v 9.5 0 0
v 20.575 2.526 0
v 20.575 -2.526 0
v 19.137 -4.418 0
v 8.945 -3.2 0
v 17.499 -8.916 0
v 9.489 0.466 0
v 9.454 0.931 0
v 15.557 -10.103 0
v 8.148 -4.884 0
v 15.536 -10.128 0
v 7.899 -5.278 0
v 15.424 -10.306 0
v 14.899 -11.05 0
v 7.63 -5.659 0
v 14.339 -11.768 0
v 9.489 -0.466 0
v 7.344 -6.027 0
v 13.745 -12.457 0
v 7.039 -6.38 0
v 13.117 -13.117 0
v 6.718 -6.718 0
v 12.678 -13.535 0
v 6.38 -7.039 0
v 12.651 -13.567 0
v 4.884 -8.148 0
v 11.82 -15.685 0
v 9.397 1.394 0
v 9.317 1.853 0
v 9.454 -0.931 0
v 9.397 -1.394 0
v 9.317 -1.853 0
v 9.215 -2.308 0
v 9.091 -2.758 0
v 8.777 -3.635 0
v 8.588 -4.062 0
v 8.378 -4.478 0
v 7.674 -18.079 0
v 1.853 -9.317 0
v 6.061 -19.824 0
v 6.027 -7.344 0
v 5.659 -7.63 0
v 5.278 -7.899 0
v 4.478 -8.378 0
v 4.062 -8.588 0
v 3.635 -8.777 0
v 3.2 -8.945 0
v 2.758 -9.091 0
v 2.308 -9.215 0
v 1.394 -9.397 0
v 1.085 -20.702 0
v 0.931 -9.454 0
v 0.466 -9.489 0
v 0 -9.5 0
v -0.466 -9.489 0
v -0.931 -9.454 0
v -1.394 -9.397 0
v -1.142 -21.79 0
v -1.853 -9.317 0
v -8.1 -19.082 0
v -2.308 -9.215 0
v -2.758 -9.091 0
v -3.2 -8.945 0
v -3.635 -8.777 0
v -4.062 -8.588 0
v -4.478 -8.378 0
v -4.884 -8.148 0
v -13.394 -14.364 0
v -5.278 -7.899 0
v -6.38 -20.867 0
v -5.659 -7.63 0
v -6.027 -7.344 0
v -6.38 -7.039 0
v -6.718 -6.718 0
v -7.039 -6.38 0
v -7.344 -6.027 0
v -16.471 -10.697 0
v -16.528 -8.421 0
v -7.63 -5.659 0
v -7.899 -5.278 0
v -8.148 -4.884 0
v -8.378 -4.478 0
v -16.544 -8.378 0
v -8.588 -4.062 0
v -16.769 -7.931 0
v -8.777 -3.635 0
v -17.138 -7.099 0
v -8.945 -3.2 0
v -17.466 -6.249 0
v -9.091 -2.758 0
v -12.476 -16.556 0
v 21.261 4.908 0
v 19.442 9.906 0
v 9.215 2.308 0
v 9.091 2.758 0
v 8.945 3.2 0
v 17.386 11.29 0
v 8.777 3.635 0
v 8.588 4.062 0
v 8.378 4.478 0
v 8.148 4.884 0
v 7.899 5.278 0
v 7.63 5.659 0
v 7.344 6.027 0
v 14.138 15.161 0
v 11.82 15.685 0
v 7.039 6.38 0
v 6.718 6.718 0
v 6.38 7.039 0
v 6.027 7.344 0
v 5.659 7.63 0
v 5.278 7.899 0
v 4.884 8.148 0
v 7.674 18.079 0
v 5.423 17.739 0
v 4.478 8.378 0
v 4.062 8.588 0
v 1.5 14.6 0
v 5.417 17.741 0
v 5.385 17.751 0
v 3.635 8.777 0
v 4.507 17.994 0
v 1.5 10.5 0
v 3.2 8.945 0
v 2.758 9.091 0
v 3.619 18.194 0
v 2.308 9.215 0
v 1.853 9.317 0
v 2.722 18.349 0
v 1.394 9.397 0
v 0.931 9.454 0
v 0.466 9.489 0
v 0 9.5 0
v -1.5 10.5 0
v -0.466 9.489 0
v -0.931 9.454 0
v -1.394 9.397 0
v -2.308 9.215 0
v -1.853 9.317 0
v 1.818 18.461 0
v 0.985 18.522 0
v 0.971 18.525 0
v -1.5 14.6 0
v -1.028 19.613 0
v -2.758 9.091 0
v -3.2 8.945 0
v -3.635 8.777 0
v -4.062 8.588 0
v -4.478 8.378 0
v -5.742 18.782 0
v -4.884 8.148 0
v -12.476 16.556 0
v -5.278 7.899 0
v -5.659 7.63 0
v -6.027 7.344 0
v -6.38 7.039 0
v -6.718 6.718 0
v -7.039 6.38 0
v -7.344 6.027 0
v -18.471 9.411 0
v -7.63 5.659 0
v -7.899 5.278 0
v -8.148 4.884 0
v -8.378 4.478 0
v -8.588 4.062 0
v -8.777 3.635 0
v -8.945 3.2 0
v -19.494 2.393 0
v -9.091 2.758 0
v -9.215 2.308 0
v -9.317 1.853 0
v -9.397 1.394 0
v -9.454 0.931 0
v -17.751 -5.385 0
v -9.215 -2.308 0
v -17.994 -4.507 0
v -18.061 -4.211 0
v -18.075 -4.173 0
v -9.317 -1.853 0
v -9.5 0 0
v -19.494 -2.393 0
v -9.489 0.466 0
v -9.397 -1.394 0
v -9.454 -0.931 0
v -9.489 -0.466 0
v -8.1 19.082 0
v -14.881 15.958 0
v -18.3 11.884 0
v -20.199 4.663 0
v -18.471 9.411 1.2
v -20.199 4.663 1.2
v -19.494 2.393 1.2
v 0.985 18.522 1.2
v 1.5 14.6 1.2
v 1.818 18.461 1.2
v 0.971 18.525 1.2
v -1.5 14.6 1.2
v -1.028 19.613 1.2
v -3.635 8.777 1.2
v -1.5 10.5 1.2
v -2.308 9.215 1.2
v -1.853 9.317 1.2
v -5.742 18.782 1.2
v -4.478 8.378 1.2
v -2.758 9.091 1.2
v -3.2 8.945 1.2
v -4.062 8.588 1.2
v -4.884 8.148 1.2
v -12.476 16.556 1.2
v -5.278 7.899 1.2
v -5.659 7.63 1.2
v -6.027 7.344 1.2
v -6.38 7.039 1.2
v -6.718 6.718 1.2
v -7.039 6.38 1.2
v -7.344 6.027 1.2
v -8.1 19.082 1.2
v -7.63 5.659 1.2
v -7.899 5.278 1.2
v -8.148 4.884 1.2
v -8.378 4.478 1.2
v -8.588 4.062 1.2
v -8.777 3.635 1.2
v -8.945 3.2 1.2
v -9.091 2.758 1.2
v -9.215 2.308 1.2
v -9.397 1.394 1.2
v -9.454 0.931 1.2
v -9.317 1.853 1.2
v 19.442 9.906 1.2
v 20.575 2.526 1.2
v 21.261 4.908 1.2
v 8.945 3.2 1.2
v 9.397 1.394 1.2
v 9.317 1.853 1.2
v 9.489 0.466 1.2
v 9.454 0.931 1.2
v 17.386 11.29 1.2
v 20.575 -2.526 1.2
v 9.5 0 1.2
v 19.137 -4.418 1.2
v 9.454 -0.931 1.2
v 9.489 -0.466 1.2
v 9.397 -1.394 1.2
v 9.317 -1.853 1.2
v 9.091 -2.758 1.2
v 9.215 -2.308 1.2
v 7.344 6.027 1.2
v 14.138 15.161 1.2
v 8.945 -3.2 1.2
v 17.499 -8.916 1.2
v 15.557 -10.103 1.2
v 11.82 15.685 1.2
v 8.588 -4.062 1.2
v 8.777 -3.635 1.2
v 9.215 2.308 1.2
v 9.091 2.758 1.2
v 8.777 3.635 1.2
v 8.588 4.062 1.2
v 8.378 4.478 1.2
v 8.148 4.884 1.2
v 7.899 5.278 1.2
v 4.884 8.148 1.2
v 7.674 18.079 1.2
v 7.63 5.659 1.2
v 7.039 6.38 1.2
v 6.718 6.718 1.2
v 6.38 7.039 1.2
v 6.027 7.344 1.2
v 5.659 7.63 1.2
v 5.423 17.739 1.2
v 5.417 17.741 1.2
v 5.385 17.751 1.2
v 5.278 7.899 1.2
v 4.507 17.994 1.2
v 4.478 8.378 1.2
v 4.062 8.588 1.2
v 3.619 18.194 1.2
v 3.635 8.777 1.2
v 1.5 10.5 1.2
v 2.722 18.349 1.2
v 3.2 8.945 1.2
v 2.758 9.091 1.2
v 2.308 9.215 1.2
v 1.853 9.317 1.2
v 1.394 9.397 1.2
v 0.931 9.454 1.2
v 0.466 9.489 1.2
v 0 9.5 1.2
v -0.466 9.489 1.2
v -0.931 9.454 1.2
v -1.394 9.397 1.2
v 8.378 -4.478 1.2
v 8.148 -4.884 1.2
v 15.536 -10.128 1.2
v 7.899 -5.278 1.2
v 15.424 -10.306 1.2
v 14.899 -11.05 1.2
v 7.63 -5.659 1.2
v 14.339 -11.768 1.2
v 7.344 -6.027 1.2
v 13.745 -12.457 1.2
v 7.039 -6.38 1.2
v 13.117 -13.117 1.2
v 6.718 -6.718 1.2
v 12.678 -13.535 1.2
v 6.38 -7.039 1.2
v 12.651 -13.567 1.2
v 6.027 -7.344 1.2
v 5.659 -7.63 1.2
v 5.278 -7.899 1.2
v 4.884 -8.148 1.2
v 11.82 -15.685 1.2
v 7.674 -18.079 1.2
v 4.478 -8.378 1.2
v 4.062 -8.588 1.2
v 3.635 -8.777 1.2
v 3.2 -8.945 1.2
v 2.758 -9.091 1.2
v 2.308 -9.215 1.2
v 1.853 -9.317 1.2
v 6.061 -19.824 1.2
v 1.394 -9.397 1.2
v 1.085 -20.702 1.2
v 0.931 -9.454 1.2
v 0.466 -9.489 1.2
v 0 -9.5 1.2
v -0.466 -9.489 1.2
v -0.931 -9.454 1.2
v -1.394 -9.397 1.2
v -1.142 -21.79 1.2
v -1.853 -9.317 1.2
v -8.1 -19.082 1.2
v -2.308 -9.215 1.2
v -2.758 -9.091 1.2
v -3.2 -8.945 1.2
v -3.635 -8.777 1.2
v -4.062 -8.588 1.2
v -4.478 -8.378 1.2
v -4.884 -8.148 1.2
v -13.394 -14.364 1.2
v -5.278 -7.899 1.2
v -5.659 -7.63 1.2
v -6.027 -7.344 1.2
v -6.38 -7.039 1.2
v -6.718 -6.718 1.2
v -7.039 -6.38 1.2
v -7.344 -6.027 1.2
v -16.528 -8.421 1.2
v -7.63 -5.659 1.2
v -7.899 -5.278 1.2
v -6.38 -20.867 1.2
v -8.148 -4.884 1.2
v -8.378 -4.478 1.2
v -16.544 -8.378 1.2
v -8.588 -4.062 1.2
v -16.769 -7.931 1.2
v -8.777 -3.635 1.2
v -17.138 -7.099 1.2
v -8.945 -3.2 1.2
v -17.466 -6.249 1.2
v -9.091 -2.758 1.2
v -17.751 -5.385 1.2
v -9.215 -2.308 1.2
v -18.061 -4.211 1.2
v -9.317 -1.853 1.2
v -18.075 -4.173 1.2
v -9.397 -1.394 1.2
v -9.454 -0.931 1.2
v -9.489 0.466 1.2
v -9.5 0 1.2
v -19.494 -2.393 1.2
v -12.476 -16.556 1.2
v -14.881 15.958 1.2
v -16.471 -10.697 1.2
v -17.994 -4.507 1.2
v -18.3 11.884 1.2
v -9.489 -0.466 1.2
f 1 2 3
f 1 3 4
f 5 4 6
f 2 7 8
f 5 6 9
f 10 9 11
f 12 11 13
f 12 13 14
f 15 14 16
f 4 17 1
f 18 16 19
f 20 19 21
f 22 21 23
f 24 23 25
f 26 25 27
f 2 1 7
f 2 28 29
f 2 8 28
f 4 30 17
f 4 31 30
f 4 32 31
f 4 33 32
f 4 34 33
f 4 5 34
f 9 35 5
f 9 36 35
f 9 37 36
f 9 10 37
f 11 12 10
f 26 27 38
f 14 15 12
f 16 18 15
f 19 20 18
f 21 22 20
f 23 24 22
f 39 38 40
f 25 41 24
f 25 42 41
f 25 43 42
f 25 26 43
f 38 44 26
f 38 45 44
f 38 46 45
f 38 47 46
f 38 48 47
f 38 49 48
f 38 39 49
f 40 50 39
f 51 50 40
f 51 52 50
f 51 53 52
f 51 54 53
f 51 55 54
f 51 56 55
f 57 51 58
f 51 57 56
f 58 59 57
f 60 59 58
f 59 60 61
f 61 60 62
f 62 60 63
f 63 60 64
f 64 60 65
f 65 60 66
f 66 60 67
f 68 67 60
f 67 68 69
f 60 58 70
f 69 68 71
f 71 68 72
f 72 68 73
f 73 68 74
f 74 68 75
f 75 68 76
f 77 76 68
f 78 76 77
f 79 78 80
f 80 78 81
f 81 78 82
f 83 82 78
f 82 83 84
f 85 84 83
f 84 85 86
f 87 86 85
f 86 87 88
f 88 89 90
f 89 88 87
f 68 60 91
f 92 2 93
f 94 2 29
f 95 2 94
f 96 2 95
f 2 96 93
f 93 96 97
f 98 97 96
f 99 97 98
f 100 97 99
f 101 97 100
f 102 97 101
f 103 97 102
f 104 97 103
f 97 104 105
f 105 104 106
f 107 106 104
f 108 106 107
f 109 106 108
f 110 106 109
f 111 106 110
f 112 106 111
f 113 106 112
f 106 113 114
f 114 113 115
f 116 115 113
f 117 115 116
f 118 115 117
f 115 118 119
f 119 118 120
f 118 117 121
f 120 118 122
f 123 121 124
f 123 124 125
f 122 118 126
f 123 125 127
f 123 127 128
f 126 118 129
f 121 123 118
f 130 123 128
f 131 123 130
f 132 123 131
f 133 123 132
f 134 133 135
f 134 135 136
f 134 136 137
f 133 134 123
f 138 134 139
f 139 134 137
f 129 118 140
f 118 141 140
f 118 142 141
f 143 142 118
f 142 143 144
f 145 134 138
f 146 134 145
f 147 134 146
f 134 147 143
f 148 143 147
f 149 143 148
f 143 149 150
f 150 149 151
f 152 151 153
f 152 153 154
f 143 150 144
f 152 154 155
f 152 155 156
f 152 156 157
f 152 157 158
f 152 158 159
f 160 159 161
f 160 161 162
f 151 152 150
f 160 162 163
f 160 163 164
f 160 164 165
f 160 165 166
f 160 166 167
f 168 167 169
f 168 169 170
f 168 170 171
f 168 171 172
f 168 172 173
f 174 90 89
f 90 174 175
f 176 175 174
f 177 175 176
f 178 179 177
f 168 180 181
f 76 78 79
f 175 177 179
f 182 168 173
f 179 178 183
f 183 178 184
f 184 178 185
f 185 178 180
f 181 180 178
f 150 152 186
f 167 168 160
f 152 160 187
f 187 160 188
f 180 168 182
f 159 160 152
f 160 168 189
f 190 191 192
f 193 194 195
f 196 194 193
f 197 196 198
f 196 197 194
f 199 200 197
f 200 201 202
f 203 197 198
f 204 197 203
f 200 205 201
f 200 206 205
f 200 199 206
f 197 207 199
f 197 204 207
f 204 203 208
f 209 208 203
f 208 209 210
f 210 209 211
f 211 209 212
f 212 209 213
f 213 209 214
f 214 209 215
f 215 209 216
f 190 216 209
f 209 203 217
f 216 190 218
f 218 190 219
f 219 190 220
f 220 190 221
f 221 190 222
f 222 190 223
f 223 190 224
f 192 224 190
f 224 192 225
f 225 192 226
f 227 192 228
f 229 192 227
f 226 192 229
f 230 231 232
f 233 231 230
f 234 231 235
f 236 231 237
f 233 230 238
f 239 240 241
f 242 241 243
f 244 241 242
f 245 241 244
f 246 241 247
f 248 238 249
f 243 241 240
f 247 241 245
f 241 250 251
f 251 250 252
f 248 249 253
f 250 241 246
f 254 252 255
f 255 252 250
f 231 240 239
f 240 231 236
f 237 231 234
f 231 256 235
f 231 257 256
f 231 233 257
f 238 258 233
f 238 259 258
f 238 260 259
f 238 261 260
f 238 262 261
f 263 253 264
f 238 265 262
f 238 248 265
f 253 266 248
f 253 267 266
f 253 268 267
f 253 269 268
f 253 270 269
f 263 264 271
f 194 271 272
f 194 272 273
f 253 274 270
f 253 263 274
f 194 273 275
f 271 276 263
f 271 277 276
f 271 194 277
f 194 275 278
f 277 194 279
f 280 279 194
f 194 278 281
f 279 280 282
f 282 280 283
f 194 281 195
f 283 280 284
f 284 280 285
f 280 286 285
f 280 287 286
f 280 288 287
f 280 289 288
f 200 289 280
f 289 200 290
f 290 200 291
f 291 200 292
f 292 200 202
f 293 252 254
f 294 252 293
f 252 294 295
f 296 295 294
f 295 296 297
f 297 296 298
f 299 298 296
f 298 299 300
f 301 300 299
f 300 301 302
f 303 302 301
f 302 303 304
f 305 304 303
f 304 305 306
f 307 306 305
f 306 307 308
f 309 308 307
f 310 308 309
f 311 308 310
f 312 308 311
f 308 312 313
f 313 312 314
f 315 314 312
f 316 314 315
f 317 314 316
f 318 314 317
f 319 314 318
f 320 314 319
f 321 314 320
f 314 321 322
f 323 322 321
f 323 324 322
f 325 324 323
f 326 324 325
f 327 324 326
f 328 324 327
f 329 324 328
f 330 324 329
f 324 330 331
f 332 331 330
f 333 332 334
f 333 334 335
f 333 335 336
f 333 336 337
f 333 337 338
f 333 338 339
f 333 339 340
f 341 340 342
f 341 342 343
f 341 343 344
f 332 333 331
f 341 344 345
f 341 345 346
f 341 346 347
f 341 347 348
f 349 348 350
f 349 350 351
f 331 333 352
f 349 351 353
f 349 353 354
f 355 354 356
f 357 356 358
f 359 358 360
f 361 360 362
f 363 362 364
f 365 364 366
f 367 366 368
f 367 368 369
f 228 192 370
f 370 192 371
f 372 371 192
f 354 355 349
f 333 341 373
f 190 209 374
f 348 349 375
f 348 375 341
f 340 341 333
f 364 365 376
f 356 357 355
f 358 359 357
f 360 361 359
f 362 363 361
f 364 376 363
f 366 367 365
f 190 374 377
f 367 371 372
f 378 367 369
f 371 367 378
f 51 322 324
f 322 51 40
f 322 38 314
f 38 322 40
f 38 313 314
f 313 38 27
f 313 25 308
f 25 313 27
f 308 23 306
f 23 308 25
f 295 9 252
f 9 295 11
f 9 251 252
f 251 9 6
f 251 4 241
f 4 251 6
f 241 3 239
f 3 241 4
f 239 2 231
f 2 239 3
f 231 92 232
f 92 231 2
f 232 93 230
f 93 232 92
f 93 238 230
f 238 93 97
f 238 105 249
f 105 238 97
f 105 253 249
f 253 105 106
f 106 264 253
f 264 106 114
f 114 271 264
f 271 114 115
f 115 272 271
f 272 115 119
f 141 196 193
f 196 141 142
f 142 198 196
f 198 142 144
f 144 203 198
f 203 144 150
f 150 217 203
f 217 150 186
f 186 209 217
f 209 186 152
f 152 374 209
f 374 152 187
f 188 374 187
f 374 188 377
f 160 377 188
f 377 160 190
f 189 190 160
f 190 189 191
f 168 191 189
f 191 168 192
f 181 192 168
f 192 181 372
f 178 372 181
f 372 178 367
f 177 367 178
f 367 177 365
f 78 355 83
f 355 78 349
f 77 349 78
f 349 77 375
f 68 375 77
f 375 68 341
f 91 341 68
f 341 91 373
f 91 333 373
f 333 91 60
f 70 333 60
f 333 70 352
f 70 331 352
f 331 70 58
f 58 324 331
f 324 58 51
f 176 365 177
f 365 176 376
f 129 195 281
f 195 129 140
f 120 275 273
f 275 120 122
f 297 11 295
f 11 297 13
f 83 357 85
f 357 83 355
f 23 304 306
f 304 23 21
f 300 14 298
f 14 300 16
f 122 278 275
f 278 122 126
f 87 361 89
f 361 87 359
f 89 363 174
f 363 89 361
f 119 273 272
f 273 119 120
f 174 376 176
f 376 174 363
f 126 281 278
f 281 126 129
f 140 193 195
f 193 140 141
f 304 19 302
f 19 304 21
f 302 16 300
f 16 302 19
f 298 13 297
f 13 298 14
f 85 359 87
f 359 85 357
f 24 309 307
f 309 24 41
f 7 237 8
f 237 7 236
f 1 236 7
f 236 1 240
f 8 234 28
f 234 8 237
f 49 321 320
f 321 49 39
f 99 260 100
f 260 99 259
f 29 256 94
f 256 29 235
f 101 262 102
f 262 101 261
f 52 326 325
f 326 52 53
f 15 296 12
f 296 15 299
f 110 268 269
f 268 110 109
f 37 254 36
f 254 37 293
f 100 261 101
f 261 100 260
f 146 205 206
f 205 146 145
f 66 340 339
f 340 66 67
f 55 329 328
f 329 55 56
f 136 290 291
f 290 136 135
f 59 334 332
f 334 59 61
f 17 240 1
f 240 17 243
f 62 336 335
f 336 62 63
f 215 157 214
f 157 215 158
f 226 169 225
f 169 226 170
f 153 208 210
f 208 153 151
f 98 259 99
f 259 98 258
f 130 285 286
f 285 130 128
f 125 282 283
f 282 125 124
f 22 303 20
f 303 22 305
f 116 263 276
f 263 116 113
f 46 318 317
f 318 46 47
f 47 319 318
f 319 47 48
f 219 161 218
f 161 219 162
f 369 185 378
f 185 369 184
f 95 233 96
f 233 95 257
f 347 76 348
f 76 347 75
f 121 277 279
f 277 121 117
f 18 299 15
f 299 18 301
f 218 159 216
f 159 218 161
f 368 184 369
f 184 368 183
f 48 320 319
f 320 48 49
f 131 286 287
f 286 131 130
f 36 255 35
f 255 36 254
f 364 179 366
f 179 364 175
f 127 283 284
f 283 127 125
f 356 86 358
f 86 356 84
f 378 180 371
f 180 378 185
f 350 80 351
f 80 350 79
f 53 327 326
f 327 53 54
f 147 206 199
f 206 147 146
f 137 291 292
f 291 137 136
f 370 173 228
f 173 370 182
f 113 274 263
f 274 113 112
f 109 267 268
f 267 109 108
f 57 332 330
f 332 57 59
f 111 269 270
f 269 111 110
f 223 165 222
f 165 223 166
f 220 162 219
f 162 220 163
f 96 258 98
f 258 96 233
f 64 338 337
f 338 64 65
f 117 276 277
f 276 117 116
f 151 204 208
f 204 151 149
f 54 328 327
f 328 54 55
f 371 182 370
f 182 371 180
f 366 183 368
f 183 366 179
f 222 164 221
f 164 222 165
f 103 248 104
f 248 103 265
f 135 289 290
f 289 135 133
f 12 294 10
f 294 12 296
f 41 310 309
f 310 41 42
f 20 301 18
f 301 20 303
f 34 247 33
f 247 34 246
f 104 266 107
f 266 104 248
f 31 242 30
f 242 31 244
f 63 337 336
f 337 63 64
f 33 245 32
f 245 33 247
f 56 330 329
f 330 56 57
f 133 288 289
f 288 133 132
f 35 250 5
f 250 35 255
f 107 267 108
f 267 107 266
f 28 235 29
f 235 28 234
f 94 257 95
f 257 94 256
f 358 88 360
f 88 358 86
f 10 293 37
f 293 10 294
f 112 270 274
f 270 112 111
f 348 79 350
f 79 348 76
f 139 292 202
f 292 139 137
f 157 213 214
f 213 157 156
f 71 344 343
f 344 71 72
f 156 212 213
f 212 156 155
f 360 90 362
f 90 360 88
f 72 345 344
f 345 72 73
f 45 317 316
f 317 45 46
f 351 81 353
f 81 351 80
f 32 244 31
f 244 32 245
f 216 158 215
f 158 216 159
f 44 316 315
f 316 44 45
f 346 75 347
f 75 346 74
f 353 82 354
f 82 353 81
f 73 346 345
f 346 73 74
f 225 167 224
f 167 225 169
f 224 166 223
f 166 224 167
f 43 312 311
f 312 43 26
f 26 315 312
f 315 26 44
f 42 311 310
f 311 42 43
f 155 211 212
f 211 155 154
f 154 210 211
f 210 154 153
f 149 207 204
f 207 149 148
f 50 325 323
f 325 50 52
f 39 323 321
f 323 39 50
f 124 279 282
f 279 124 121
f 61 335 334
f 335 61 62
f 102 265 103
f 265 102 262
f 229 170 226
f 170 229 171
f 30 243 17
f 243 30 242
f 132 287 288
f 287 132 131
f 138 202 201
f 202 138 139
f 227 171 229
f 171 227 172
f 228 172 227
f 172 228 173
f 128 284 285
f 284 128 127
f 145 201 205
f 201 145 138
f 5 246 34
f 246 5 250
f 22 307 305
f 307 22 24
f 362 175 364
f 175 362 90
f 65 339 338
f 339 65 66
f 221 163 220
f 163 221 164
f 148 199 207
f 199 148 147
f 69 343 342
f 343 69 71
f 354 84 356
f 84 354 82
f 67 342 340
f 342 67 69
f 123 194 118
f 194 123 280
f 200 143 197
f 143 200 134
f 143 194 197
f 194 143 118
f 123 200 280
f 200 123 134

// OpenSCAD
/*
  Elna Supermatic cam 12
  Name: Spindle
  Status: candidate

  Generated from measured parametric base v2.
  Surface mode: stepped
*/

include <_elna_measured_common.scad>;

profile_points = [
        [0.9708, 18.5246],
        [5.4235, 17.7395],
        [7.6740, 18.0787],
        [11.8196, 15.6852],
        [14.1378, 15.1610],
        [17.3856, 11.2904],
        [19.4418, 9.9061],
        [21.2608, 4.9084],
        [20.5755, 2.5264],
        [20.5755, -2.5264],
        [19.1366, -4.4180],
        [17.4994, -8.9164],
        [15.5573, -10.1031],
        [12.6511, -13.5666],
        [11.8196, -15.6852],
        [7.6740, -18.0787],
        [6.0609, -19.8242],
        [1.0849, -20.7016],
        [-1.1420, -21.7901],
        [-6.3796, -20.8666],
        [-8.0999, -19.0821],
        [-12.4756, -16.5557],
        [-13.3944, -14.3638],
        [-16.4715, -10.6967],
        [-16.5282, -8.4215],
        [-18.0746, -4.1728],
        [-19.4936, -2.3935],
        [-19.4936, 2.3935],
        [-20.1987, 4.6632],
        [-18.4706, 9.4112],
        [-18.2998, 11.8840],
        [-14.8812, 15.9581],
        [-12.4756, 16.5557],
        [-8.0999, 19.0821],
        [-5.7422, 18.7818],
        [-1.0279, 19.6131]
];

icon_points = [[-1.000,0.500], [-0.800,0.200], [-0.560,0.120], [-0.340,0.300], [-0.160,0.640], [0.000,0.880], [0.160,0.640], [0.340,0.300], [0.560,0.120], [0.800,0.200], [1.000,0.500]];

elna_cam_ring(profile_points=profile_points);
